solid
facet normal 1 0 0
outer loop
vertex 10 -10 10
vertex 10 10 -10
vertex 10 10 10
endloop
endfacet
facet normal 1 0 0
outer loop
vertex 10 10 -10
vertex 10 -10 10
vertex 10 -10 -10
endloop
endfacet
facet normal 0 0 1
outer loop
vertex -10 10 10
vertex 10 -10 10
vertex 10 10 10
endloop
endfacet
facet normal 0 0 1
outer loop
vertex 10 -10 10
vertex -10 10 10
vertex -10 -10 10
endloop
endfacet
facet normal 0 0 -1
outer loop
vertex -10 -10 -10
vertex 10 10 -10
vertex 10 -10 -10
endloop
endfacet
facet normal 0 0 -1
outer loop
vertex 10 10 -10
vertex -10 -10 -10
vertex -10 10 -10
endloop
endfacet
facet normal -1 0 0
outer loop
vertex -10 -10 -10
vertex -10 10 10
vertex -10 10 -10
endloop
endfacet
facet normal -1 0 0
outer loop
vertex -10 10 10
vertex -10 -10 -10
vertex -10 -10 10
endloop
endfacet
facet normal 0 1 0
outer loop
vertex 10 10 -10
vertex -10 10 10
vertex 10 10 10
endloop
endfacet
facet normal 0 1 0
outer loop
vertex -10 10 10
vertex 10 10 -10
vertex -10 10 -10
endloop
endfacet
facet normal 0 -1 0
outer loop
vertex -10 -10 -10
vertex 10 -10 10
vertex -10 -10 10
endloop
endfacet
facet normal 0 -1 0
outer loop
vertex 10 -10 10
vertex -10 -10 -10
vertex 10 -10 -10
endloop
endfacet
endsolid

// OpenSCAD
// Deliberately contains partially transparent geometry, which is the case the plain
// transparent-background export gets wrong. Used by transparent_compositing_pngtest.py.
color([1, 0, 0, 0.5]) cube(20, center = true);
color([0, 0, 1, 1]) sphere(7);
%cube([30, 4, 4], center = true);
